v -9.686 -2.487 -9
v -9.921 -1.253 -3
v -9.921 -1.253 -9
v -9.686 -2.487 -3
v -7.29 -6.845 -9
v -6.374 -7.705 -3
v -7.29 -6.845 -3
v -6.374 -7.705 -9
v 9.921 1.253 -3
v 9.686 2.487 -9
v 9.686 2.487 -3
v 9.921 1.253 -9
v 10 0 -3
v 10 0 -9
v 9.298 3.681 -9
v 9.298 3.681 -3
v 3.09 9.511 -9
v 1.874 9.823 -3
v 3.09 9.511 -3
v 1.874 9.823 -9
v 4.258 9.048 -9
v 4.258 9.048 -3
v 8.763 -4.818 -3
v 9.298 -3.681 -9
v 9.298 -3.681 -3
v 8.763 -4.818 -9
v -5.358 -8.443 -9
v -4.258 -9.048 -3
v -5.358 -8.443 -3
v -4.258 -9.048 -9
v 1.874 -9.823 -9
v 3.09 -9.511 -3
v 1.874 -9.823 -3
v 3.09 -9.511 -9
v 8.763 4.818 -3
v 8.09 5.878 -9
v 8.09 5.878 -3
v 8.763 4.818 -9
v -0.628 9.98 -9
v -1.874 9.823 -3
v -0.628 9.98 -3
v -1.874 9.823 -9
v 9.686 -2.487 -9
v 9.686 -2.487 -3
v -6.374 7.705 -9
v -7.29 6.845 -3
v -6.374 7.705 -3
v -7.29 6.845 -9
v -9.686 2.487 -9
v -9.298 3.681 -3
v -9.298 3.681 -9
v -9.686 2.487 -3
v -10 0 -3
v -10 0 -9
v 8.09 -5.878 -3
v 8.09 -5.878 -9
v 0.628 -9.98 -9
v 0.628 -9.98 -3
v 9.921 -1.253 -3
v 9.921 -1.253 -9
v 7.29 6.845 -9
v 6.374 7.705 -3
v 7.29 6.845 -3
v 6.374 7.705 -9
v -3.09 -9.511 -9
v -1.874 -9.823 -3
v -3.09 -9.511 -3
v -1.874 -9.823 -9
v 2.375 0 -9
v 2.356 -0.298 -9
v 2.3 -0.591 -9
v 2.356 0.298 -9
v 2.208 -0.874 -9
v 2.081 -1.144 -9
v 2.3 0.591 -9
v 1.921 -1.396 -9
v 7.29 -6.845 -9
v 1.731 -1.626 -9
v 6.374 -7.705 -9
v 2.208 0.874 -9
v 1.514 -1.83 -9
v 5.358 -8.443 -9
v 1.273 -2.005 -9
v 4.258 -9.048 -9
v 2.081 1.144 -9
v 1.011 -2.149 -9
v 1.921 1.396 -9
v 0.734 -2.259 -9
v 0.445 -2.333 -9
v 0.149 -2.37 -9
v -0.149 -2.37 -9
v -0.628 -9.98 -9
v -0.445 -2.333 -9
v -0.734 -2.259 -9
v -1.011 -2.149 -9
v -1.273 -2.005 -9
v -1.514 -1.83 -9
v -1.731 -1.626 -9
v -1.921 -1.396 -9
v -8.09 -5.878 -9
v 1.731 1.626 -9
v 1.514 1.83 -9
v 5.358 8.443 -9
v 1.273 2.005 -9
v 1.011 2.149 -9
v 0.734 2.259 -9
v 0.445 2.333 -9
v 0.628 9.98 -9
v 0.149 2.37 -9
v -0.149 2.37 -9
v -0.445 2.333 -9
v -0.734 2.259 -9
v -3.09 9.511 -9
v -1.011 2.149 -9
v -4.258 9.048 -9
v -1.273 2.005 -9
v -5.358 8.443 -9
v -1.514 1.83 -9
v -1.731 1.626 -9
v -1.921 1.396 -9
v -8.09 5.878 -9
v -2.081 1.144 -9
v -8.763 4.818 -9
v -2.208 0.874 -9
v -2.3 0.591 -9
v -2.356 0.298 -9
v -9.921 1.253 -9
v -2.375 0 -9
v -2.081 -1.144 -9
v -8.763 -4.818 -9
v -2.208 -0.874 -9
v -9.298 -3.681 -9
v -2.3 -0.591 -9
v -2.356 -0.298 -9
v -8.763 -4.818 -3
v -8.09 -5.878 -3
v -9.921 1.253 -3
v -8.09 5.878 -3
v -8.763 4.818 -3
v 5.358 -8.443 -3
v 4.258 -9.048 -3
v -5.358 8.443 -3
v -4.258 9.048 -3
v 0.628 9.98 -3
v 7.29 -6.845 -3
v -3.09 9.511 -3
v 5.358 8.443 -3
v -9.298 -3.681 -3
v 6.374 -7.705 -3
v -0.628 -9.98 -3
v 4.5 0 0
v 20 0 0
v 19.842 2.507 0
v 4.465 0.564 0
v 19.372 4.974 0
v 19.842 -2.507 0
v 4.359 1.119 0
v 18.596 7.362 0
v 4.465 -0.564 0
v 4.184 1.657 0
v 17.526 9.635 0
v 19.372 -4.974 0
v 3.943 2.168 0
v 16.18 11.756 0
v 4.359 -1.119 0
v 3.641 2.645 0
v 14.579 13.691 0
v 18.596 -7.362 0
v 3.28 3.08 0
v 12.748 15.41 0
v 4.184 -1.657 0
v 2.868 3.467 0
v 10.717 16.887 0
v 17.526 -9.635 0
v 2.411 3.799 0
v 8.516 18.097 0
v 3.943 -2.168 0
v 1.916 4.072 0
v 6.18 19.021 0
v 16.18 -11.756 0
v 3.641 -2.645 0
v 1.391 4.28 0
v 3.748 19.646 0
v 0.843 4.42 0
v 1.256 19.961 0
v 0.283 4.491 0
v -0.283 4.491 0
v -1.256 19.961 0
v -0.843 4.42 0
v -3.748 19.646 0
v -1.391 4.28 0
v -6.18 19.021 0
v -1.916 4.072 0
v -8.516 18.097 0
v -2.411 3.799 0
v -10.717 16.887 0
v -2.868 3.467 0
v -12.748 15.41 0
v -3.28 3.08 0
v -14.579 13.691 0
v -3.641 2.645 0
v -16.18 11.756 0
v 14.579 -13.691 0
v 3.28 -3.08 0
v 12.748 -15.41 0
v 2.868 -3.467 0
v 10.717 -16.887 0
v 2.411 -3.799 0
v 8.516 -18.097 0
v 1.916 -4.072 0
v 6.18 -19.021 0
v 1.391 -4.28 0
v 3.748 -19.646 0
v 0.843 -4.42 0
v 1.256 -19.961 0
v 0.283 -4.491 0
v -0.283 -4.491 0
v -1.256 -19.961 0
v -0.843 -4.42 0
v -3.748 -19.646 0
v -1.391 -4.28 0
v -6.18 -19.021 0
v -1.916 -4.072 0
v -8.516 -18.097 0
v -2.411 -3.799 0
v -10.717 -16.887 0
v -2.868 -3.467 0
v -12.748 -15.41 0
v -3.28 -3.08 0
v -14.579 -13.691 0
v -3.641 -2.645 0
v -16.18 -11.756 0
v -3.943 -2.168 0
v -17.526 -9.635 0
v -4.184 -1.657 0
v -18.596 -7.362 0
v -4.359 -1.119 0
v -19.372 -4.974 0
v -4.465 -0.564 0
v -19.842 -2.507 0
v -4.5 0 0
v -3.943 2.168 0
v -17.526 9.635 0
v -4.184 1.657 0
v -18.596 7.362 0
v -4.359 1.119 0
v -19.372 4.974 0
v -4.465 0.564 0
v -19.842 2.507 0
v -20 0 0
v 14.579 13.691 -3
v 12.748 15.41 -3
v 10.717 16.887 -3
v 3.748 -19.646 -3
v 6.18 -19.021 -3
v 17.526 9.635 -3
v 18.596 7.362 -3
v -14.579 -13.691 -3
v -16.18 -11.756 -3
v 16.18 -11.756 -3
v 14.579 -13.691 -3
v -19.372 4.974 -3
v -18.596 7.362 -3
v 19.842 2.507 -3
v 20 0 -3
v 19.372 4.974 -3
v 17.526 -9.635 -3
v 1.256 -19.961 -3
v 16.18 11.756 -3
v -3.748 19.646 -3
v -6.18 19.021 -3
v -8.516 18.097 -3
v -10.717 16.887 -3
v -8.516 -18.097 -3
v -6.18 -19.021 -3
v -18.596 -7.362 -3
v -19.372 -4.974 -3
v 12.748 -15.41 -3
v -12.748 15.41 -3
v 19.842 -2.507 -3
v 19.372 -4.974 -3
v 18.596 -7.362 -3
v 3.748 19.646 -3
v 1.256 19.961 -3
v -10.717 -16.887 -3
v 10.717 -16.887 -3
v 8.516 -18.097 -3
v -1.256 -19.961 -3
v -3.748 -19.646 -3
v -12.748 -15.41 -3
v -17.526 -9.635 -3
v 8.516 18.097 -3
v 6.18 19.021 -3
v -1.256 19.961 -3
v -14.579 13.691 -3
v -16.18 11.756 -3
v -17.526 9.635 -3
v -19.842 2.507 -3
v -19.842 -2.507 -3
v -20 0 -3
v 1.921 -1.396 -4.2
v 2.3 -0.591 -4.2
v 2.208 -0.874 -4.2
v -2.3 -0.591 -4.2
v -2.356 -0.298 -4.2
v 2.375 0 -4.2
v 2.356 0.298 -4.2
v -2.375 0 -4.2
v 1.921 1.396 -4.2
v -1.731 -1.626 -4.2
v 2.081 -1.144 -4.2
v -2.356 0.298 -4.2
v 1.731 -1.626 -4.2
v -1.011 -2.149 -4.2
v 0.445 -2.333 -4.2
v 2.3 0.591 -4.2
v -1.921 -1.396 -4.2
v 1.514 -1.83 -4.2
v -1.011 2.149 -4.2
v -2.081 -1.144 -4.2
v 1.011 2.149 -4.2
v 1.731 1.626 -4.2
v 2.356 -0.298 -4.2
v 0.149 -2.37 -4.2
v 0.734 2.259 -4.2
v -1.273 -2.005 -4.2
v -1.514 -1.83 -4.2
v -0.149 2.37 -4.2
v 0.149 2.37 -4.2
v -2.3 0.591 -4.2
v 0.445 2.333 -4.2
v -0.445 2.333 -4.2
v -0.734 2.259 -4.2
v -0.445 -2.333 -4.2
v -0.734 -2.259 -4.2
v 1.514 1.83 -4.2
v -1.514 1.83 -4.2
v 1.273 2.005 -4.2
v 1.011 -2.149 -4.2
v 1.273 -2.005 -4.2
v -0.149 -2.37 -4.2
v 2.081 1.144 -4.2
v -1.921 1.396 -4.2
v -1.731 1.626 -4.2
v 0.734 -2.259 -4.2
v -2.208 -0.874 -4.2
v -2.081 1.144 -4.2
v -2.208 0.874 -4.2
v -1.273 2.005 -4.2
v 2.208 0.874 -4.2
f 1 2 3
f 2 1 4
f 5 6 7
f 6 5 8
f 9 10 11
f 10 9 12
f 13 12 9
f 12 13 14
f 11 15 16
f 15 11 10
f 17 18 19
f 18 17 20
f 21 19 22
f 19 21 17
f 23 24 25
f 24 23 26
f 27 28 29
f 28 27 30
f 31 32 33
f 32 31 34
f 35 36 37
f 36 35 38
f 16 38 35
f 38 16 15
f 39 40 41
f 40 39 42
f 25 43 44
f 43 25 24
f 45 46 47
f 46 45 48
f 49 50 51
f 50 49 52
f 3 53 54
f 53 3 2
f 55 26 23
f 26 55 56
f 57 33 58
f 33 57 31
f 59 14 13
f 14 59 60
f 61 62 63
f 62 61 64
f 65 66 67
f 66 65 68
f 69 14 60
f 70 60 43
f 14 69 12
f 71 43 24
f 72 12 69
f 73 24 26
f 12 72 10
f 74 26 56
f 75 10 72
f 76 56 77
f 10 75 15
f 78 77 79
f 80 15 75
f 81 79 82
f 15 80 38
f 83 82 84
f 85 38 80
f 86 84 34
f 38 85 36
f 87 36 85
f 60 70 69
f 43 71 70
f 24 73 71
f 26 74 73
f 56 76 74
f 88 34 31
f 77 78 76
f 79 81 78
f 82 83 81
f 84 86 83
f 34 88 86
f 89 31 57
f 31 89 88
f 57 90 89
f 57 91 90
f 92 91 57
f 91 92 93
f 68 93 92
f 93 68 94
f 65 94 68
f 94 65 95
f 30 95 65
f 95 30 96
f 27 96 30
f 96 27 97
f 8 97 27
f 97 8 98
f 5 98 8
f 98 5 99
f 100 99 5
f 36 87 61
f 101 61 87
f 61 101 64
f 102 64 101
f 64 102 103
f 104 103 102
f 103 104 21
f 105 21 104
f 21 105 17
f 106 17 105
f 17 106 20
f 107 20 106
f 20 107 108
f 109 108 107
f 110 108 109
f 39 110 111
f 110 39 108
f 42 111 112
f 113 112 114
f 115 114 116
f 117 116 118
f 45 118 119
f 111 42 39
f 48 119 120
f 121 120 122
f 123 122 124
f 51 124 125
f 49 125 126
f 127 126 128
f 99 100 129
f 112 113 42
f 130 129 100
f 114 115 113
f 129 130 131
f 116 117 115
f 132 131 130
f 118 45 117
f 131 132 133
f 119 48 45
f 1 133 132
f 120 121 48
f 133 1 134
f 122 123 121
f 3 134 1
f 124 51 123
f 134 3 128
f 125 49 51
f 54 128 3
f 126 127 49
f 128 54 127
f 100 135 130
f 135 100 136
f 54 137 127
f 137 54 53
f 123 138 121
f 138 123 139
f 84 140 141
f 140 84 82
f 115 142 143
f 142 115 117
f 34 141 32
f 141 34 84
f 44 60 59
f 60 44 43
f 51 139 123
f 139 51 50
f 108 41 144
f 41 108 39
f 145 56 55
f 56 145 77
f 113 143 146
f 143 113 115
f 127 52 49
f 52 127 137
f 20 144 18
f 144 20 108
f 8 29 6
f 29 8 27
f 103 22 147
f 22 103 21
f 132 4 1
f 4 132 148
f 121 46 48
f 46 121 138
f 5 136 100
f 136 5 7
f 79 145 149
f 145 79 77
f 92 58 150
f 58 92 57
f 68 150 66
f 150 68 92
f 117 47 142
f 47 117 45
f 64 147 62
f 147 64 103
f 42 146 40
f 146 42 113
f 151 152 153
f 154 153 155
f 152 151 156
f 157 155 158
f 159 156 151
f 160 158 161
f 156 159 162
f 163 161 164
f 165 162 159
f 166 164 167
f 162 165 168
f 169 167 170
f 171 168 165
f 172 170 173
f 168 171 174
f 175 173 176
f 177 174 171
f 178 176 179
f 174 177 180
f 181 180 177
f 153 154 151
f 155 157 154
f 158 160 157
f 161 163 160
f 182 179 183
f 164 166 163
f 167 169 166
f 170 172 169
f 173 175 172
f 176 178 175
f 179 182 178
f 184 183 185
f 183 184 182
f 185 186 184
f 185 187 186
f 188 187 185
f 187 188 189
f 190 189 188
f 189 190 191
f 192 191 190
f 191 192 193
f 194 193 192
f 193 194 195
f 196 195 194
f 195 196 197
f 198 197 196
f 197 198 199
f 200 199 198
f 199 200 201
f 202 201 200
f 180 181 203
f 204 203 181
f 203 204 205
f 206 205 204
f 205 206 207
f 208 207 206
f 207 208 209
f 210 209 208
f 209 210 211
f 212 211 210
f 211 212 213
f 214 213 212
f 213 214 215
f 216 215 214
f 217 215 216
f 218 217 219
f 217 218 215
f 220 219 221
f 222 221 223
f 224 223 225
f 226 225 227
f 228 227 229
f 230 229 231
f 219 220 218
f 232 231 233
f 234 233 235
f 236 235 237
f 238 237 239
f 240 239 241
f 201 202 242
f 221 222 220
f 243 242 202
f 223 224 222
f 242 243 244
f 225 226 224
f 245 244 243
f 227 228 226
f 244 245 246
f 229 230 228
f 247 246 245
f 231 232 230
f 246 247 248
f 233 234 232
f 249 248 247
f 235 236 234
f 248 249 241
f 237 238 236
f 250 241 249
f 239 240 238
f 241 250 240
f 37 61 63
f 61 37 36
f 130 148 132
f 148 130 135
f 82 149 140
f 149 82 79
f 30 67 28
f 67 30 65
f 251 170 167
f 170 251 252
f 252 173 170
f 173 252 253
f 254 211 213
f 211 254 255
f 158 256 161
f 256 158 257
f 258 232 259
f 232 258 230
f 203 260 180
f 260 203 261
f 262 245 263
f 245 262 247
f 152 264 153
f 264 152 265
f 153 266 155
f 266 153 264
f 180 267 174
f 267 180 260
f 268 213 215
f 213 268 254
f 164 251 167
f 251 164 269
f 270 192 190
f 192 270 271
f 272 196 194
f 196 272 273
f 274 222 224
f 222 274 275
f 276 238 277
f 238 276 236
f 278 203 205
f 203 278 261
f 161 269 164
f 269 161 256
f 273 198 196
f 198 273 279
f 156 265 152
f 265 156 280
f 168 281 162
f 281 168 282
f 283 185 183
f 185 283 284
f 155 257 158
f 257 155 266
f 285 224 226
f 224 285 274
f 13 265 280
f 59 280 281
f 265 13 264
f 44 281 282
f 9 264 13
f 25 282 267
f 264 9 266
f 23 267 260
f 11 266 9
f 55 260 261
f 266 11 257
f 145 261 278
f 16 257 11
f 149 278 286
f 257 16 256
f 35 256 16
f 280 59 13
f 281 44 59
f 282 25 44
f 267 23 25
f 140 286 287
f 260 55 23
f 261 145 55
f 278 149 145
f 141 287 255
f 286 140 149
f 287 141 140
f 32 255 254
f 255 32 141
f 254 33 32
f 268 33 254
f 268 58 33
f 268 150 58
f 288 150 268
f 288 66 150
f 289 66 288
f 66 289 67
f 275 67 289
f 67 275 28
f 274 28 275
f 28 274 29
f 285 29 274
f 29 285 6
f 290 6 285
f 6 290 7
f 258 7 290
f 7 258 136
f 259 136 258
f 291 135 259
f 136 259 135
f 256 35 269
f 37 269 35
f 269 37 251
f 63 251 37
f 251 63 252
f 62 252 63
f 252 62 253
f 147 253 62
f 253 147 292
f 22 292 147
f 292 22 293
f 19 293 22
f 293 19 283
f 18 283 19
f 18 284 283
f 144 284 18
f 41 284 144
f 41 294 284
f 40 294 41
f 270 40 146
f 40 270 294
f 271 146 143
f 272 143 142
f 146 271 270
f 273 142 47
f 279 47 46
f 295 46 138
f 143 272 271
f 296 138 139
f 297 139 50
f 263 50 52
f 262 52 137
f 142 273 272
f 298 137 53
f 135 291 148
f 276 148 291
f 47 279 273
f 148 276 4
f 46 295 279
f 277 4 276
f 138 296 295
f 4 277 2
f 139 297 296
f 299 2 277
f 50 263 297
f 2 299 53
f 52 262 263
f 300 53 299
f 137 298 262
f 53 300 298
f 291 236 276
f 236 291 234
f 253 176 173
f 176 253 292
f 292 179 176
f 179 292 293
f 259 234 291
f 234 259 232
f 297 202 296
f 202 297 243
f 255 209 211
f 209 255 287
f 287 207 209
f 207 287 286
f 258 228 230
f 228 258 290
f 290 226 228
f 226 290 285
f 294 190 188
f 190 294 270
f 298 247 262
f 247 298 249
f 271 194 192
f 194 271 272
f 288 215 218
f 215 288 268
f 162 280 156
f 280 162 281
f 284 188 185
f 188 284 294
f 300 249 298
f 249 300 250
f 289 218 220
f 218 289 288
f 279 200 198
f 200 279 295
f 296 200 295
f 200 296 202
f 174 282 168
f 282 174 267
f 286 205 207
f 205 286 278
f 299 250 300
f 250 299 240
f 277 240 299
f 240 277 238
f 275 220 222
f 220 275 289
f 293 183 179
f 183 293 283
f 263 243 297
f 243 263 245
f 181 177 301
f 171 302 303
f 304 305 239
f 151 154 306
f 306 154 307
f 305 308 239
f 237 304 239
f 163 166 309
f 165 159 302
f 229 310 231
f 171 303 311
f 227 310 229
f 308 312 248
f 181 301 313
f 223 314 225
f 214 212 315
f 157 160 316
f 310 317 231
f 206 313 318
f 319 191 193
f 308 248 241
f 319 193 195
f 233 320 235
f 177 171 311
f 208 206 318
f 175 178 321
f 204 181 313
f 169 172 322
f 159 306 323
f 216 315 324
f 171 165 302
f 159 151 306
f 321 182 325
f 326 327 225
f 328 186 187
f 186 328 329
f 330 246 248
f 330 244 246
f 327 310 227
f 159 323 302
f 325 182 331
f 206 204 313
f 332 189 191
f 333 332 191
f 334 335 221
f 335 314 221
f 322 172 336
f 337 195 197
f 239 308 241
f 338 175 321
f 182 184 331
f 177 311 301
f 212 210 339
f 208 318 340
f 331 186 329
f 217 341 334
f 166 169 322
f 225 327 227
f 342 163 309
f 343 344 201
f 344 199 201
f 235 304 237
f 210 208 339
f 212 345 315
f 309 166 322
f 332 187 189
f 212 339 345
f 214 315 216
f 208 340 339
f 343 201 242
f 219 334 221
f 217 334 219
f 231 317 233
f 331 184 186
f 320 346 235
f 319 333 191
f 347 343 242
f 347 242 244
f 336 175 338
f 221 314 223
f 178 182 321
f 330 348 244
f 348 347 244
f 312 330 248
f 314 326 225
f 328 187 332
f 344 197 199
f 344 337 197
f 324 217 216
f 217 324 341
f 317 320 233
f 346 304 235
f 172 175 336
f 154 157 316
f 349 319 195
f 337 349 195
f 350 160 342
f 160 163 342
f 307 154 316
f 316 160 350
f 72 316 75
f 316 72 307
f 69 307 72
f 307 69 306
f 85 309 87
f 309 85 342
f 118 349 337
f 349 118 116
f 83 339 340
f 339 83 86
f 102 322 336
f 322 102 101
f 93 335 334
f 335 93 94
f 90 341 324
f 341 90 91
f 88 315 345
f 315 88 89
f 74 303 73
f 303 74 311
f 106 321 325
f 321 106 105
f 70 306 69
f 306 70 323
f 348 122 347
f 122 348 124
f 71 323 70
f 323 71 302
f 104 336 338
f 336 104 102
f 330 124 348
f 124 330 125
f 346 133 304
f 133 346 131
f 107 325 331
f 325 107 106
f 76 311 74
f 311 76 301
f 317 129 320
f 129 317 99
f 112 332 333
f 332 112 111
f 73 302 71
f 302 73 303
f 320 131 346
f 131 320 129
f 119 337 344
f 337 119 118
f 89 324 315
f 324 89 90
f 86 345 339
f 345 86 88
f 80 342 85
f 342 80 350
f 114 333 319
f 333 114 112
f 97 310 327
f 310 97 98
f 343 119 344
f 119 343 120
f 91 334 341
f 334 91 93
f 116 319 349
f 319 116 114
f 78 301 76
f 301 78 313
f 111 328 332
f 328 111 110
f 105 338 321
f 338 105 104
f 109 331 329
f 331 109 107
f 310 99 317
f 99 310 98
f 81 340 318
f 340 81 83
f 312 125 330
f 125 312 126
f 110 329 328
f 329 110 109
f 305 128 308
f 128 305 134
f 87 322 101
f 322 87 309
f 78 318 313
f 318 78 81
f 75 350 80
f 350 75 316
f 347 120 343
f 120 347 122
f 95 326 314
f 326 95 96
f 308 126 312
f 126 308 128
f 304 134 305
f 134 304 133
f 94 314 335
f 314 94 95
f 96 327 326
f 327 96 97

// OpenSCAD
$fn = 50;


difference() {
	union() {
		translate(v = [0, 0, -9.0000000000]) {
			cylinder(h = 9, r = 10.0000000000);
		}
		translate(v = [0, 0, -3.0000000000]) {
			cylinder(h = 3, r = 20.0000000000);
		}
	}
	union() {
		translate(v = [0, 0, 0]) {
			rotate(a = [0, 0, 0]) {
				difference() {
					union() {
						#translate(v = [0, 0, -9.0000000000]) {
							cylinder(h = 9, r = 2.2500000000);
						}
						#translate(v = [0, 0, -4.2000000000]) {
							cylinder(h = 4.2000000000, r = 10.0000000000, r1 = 2.3750000000, r2 = 4.5000000000);
						}
						#translate(v = [0, 0, -9.0000000000]) {
							cylinder(h = 9, r = 2.3750000000);
						}
						#translate(v = [0, 0, -9.0000000000]) {
							cylinder(h = 9, r = 2.2500000000);
						}
					}
					union();
				}
			}
		}
	}
}
